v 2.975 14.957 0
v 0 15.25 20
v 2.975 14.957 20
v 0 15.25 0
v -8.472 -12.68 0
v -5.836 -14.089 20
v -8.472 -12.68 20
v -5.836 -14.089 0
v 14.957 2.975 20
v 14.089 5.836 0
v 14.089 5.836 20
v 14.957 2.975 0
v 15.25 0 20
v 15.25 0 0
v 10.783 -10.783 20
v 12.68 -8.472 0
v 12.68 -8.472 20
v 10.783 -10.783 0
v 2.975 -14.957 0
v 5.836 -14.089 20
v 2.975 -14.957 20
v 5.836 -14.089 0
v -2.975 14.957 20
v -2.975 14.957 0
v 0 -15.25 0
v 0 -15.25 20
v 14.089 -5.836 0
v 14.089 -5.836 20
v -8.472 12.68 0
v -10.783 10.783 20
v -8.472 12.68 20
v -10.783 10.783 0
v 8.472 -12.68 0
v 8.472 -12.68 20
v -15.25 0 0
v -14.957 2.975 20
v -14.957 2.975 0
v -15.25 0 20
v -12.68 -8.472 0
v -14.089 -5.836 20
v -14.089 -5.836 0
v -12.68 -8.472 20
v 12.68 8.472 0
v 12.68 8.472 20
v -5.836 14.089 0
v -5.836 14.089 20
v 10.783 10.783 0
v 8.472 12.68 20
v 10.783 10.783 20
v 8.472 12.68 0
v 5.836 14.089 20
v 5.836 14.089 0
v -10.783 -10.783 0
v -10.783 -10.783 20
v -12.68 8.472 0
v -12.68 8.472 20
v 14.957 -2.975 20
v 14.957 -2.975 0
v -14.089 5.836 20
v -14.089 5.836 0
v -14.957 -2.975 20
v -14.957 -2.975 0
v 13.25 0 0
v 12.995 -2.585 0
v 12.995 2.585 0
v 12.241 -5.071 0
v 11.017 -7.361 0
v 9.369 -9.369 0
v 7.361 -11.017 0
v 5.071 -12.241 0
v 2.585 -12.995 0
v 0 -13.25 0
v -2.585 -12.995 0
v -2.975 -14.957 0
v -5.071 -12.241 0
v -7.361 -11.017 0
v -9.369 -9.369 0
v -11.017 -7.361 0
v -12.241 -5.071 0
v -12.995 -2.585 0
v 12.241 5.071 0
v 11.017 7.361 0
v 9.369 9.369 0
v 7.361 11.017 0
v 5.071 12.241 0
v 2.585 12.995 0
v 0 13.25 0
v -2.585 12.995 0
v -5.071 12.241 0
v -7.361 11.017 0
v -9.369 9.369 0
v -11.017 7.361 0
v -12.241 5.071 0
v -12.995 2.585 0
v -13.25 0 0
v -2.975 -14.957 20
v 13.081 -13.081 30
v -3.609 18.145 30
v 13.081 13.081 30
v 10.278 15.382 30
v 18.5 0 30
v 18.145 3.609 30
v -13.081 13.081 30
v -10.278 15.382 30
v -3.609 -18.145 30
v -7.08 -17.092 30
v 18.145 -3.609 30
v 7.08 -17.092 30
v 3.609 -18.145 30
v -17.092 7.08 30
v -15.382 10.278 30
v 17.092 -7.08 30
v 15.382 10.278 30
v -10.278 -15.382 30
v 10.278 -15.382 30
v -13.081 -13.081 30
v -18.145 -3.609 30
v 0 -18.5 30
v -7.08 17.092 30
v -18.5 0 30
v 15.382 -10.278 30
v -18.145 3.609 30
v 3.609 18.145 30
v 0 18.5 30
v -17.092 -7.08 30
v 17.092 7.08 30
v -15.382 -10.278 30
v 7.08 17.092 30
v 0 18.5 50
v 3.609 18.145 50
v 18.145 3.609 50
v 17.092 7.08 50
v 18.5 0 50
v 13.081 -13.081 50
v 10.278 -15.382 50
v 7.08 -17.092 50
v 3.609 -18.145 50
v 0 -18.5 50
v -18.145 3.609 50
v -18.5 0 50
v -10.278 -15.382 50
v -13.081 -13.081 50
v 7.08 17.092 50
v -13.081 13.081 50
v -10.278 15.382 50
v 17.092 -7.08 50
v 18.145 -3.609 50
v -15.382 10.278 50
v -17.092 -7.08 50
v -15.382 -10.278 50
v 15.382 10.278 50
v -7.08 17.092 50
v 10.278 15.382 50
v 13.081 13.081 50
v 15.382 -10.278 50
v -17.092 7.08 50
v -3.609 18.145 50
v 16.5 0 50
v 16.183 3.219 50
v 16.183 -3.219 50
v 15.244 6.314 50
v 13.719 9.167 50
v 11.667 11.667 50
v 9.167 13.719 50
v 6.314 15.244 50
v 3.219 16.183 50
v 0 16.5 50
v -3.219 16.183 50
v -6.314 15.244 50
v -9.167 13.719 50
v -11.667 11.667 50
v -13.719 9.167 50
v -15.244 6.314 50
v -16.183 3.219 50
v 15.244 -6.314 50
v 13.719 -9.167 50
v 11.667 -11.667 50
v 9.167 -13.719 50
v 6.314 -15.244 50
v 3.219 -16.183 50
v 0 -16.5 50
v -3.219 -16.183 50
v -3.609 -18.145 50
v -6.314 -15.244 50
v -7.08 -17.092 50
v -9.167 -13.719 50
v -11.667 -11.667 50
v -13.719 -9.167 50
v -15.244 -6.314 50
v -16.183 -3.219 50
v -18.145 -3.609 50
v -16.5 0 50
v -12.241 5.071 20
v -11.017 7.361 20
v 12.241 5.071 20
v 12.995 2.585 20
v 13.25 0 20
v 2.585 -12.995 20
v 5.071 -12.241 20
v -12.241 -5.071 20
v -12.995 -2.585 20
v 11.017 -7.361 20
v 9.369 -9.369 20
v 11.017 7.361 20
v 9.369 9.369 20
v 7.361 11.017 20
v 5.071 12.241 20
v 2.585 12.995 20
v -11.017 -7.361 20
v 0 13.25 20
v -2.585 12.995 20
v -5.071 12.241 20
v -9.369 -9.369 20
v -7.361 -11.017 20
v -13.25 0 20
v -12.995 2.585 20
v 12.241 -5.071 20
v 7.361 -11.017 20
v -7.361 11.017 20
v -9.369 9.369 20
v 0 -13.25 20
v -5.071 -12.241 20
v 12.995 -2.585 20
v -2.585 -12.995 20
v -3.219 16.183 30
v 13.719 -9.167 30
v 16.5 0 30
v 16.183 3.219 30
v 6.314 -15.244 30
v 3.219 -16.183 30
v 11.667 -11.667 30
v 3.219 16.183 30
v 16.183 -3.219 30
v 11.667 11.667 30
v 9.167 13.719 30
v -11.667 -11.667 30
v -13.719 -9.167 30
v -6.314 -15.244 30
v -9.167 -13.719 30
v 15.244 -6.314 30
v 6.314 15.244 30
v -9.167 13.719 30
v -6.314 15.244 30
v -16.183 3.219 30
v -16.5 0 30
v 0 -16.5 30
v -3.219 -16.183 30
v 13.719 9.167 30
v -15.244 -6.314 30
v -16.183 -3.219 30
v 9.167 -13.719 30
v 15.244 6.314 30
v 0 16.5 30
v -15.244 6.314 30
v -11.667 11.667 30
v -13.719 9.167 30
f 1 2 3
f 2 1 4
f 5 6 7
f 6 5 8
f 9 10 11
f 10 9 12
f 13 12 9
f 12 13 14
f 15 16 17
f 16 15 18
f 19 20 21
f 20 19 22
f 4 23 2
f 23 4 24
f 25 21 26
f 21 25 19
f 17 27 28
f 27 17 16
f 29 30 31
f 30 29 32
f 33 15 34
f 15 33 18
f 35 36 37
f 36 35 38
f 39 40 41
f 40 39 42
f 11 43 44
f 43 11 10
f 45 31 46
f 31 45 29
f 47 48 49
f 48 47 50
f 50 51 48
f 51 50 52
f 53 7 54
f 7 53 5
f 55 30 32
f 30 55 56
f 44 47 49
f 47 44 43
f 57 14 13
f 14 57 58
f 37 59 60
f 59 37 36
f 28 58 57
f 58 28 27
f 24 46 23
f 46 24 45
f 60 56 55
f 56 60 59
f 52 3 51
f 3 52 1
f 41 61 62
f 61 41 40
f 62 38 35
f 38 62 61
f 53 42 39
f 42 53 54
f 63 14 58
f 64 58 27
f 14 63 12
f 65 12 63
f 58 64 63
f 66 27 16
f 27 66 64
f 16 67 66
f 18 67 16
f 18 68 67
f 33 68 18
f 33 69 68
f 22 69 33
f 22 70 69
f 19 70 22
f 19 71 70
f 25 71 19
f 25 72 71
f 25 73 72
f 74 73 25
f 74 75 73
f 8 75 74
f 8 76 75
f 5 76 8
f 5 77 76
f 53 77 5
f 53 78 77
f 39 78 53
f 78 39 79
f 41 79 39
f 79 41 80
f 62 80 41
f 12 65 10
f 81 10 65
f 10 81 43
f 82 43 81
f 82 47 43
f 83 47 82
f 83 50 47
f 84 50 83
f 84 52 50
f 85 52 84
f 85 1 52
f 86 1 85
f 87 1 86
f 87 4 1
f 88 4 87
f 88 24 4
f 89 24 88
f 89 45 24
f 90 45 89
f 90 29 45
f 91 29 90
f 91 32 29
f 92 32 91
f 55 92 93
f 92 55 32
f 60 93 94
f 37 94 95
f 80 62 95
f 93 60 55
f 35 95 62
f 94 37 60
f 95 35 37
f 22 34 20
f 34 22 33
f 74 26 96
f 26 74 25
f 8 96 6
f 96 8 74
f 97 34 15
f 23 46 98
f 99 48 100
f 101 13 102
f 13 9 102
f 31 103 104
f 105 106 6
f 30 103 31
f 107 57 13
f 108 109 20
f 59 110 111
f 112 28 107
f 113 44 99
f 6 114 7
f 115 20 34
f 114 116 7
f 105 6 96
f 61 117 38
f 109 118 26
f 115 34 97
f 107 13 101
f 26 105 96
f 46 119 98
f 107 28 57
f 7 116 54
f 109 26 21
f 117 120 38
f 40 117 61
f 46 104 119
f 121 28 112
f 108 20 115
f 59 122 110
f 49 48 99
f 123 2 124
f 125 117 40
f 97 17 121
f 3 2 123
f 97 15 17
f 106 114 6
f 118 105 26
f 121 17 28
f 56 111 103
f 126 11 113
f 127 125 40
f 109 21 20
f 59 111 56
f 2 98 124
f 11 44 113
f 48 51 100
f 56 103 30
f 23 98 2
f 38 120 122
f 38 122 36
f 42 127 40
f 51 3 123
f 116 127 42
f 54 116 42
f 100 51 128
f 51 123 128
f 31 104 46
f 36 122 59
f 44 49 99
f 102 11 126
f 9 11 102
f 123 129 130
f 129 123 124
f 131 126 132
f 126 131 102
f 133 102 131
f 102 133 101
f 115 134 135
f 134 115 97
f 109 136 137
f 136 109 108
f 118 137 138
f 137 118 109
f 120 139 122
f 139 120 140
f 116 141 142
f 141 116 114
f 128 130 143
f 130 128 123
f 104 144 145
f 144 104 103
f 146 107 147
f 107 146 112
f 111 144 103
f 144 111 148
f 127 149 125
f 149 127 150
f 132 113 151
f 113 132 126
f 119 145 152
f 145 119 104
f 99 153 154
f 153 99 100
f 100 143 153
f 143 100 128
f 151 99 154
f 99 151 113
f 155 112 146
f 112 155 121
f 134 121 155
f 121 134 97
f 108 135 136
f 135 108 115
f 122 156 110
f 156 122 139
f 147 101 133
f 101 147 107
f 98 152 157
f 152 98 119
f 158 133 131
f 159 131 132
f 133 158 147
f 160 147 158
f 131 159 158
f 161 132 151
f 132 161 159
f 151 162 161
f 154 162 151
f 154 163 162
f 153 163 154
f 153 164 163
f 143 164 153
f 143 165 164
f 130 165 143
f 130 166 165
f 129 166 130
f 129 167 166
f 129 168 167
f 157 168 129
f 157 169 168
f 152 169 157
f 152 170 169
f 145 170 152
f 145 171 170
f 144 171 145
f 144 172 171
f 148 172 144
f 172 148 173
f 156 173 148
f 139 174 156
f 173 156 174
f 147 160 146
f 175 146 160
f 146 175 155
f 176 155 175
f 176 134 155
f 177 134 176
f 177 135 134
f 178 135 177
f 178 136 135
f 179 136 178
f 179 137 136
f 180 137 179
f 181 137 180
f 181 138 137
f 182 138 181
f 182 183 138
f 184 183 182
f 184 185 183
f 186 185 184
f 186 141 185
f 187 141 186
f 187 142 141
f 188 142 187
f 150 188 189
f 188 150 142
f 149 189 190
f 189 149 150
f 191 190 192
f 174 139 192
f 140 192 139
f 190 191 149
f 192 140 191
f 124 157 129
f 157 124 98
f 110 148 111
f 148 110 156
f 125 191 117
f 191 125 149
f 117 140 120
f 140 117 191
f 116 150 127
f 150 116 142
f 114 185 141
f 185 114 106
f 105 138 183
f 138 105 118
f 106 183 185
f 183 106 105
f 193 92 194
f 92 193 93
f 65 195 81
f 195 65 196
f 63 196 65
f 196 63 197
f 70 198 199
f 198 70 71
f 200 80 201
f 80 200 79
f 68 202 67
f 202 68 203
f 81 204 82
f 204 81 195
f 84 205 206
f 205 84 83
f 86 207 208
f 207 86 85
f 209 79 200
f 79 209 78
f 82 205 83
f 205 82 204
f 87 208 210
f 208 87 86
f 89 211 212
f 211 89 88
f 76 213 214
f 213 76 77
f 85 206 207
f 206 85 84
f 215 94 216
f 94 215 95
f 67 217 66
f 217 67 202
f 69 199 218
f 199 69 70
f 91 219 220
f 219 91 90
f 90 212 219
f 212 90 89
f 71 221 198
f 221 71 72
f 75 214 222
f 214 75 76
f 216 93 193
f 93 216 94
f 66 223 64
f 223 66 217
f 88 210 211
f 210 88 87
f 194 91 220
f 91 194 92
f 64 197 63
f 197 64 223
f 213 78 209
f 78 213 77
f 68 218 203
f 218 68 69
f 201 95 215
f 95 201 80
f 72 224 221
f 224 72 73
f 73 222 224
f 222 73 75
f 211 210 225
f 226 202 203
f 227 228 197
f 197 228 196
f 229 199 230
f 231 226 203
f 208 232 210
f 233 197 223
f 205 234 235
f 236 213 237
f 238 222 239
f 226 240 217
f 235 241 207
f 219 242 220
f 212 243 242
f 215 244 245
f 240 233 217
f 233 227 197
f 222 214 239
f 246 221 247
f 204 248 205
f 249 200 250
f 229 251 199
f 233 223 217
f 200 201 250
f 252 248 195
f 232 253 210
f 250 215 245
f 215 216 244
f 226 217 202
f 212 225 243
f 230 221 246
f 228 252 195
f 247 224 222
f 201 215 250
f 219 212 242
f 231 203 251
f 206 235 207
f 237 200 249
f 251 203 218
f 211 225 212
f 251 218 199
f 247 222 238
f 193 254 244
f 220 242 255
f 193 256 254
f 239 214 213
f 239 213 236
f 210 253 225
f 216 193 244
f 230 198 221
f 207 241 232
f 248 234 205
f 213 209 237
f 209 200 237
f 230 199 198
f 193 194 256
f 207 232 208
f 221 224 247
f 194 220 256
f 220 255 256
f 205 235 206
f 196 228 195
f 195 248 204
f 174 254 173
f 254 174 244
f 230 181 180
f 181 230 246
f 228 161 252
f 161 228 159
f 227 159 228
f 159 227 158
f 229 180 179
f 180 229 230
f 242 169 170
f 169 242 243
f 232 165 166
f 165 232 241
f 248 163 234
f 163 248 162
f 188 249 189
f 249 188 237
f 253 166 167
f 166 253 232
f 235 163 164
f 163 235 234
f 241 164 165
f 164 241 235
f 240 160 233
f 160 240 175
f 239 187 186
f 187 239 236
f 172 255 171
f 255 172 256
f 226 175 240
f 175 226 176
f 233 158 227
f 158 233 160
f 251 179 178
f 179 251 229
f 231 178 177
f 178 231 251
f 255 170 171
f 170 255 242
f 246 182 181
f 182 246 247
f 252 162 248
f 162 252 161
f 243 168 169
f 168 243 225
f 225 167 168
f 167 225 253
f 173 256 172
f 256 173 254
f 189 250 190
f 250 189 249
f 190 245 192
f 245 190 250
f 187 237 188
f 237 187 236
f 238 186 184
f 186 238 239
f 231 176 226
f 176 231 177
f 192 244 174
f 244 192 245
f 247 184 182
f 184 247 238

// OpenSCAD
/**
 * Kreg pocket hole jig adapter for Makita vacuums and dust extractors.
 *
 * This adapter fits inside the dust port of Kreg pocket hole jigs and enables
 * them to be connected to Makita vacuums.
 */

/**
 * The height of the adapter's end sections. These sections fit into the dust
 * port and vacuum hose.
 */
END_SECTION_HEIGHT = 20;

/**
 * The height of the adapter's middle section. This section connects the two end
 * sections.
 */
MIDDLE_SECTION_HEIGHT = 10;

/**
 * Creates a hose adapter.
 *
 * @param d1 The inside diameter of the dust port.
 * @param d2 The inside diameter of the vacuum hose.
 * @param thickness The adapter thickness.
 */
module hose_adapter(d1, d2, thickness) {
  module shell(d1, d2) {
    cylinder(h=END_SECTION_HEIGHT, d=d1, $fn=32);
    translate([0, 0, END_SECTION_HEIGHT])
      cylinder(h=MIDDLE_SECTION_HEIGHT, d1=d1, d2=d2, $fn=32);
    translate([0, 0, END_SECTION_HEIGHT + MIDDLE_SECTION_HEIGHT])
      cylinder(h=END_SECTION_HEIGHT, d=d2, $fn=32);
  }
    
  difference() {
    shell(d1, d2);
    shell(d1 - 2 * thickness, d2 - 2 * thickness);
  }
}

hose_adapter(30.5, 37, 2);
